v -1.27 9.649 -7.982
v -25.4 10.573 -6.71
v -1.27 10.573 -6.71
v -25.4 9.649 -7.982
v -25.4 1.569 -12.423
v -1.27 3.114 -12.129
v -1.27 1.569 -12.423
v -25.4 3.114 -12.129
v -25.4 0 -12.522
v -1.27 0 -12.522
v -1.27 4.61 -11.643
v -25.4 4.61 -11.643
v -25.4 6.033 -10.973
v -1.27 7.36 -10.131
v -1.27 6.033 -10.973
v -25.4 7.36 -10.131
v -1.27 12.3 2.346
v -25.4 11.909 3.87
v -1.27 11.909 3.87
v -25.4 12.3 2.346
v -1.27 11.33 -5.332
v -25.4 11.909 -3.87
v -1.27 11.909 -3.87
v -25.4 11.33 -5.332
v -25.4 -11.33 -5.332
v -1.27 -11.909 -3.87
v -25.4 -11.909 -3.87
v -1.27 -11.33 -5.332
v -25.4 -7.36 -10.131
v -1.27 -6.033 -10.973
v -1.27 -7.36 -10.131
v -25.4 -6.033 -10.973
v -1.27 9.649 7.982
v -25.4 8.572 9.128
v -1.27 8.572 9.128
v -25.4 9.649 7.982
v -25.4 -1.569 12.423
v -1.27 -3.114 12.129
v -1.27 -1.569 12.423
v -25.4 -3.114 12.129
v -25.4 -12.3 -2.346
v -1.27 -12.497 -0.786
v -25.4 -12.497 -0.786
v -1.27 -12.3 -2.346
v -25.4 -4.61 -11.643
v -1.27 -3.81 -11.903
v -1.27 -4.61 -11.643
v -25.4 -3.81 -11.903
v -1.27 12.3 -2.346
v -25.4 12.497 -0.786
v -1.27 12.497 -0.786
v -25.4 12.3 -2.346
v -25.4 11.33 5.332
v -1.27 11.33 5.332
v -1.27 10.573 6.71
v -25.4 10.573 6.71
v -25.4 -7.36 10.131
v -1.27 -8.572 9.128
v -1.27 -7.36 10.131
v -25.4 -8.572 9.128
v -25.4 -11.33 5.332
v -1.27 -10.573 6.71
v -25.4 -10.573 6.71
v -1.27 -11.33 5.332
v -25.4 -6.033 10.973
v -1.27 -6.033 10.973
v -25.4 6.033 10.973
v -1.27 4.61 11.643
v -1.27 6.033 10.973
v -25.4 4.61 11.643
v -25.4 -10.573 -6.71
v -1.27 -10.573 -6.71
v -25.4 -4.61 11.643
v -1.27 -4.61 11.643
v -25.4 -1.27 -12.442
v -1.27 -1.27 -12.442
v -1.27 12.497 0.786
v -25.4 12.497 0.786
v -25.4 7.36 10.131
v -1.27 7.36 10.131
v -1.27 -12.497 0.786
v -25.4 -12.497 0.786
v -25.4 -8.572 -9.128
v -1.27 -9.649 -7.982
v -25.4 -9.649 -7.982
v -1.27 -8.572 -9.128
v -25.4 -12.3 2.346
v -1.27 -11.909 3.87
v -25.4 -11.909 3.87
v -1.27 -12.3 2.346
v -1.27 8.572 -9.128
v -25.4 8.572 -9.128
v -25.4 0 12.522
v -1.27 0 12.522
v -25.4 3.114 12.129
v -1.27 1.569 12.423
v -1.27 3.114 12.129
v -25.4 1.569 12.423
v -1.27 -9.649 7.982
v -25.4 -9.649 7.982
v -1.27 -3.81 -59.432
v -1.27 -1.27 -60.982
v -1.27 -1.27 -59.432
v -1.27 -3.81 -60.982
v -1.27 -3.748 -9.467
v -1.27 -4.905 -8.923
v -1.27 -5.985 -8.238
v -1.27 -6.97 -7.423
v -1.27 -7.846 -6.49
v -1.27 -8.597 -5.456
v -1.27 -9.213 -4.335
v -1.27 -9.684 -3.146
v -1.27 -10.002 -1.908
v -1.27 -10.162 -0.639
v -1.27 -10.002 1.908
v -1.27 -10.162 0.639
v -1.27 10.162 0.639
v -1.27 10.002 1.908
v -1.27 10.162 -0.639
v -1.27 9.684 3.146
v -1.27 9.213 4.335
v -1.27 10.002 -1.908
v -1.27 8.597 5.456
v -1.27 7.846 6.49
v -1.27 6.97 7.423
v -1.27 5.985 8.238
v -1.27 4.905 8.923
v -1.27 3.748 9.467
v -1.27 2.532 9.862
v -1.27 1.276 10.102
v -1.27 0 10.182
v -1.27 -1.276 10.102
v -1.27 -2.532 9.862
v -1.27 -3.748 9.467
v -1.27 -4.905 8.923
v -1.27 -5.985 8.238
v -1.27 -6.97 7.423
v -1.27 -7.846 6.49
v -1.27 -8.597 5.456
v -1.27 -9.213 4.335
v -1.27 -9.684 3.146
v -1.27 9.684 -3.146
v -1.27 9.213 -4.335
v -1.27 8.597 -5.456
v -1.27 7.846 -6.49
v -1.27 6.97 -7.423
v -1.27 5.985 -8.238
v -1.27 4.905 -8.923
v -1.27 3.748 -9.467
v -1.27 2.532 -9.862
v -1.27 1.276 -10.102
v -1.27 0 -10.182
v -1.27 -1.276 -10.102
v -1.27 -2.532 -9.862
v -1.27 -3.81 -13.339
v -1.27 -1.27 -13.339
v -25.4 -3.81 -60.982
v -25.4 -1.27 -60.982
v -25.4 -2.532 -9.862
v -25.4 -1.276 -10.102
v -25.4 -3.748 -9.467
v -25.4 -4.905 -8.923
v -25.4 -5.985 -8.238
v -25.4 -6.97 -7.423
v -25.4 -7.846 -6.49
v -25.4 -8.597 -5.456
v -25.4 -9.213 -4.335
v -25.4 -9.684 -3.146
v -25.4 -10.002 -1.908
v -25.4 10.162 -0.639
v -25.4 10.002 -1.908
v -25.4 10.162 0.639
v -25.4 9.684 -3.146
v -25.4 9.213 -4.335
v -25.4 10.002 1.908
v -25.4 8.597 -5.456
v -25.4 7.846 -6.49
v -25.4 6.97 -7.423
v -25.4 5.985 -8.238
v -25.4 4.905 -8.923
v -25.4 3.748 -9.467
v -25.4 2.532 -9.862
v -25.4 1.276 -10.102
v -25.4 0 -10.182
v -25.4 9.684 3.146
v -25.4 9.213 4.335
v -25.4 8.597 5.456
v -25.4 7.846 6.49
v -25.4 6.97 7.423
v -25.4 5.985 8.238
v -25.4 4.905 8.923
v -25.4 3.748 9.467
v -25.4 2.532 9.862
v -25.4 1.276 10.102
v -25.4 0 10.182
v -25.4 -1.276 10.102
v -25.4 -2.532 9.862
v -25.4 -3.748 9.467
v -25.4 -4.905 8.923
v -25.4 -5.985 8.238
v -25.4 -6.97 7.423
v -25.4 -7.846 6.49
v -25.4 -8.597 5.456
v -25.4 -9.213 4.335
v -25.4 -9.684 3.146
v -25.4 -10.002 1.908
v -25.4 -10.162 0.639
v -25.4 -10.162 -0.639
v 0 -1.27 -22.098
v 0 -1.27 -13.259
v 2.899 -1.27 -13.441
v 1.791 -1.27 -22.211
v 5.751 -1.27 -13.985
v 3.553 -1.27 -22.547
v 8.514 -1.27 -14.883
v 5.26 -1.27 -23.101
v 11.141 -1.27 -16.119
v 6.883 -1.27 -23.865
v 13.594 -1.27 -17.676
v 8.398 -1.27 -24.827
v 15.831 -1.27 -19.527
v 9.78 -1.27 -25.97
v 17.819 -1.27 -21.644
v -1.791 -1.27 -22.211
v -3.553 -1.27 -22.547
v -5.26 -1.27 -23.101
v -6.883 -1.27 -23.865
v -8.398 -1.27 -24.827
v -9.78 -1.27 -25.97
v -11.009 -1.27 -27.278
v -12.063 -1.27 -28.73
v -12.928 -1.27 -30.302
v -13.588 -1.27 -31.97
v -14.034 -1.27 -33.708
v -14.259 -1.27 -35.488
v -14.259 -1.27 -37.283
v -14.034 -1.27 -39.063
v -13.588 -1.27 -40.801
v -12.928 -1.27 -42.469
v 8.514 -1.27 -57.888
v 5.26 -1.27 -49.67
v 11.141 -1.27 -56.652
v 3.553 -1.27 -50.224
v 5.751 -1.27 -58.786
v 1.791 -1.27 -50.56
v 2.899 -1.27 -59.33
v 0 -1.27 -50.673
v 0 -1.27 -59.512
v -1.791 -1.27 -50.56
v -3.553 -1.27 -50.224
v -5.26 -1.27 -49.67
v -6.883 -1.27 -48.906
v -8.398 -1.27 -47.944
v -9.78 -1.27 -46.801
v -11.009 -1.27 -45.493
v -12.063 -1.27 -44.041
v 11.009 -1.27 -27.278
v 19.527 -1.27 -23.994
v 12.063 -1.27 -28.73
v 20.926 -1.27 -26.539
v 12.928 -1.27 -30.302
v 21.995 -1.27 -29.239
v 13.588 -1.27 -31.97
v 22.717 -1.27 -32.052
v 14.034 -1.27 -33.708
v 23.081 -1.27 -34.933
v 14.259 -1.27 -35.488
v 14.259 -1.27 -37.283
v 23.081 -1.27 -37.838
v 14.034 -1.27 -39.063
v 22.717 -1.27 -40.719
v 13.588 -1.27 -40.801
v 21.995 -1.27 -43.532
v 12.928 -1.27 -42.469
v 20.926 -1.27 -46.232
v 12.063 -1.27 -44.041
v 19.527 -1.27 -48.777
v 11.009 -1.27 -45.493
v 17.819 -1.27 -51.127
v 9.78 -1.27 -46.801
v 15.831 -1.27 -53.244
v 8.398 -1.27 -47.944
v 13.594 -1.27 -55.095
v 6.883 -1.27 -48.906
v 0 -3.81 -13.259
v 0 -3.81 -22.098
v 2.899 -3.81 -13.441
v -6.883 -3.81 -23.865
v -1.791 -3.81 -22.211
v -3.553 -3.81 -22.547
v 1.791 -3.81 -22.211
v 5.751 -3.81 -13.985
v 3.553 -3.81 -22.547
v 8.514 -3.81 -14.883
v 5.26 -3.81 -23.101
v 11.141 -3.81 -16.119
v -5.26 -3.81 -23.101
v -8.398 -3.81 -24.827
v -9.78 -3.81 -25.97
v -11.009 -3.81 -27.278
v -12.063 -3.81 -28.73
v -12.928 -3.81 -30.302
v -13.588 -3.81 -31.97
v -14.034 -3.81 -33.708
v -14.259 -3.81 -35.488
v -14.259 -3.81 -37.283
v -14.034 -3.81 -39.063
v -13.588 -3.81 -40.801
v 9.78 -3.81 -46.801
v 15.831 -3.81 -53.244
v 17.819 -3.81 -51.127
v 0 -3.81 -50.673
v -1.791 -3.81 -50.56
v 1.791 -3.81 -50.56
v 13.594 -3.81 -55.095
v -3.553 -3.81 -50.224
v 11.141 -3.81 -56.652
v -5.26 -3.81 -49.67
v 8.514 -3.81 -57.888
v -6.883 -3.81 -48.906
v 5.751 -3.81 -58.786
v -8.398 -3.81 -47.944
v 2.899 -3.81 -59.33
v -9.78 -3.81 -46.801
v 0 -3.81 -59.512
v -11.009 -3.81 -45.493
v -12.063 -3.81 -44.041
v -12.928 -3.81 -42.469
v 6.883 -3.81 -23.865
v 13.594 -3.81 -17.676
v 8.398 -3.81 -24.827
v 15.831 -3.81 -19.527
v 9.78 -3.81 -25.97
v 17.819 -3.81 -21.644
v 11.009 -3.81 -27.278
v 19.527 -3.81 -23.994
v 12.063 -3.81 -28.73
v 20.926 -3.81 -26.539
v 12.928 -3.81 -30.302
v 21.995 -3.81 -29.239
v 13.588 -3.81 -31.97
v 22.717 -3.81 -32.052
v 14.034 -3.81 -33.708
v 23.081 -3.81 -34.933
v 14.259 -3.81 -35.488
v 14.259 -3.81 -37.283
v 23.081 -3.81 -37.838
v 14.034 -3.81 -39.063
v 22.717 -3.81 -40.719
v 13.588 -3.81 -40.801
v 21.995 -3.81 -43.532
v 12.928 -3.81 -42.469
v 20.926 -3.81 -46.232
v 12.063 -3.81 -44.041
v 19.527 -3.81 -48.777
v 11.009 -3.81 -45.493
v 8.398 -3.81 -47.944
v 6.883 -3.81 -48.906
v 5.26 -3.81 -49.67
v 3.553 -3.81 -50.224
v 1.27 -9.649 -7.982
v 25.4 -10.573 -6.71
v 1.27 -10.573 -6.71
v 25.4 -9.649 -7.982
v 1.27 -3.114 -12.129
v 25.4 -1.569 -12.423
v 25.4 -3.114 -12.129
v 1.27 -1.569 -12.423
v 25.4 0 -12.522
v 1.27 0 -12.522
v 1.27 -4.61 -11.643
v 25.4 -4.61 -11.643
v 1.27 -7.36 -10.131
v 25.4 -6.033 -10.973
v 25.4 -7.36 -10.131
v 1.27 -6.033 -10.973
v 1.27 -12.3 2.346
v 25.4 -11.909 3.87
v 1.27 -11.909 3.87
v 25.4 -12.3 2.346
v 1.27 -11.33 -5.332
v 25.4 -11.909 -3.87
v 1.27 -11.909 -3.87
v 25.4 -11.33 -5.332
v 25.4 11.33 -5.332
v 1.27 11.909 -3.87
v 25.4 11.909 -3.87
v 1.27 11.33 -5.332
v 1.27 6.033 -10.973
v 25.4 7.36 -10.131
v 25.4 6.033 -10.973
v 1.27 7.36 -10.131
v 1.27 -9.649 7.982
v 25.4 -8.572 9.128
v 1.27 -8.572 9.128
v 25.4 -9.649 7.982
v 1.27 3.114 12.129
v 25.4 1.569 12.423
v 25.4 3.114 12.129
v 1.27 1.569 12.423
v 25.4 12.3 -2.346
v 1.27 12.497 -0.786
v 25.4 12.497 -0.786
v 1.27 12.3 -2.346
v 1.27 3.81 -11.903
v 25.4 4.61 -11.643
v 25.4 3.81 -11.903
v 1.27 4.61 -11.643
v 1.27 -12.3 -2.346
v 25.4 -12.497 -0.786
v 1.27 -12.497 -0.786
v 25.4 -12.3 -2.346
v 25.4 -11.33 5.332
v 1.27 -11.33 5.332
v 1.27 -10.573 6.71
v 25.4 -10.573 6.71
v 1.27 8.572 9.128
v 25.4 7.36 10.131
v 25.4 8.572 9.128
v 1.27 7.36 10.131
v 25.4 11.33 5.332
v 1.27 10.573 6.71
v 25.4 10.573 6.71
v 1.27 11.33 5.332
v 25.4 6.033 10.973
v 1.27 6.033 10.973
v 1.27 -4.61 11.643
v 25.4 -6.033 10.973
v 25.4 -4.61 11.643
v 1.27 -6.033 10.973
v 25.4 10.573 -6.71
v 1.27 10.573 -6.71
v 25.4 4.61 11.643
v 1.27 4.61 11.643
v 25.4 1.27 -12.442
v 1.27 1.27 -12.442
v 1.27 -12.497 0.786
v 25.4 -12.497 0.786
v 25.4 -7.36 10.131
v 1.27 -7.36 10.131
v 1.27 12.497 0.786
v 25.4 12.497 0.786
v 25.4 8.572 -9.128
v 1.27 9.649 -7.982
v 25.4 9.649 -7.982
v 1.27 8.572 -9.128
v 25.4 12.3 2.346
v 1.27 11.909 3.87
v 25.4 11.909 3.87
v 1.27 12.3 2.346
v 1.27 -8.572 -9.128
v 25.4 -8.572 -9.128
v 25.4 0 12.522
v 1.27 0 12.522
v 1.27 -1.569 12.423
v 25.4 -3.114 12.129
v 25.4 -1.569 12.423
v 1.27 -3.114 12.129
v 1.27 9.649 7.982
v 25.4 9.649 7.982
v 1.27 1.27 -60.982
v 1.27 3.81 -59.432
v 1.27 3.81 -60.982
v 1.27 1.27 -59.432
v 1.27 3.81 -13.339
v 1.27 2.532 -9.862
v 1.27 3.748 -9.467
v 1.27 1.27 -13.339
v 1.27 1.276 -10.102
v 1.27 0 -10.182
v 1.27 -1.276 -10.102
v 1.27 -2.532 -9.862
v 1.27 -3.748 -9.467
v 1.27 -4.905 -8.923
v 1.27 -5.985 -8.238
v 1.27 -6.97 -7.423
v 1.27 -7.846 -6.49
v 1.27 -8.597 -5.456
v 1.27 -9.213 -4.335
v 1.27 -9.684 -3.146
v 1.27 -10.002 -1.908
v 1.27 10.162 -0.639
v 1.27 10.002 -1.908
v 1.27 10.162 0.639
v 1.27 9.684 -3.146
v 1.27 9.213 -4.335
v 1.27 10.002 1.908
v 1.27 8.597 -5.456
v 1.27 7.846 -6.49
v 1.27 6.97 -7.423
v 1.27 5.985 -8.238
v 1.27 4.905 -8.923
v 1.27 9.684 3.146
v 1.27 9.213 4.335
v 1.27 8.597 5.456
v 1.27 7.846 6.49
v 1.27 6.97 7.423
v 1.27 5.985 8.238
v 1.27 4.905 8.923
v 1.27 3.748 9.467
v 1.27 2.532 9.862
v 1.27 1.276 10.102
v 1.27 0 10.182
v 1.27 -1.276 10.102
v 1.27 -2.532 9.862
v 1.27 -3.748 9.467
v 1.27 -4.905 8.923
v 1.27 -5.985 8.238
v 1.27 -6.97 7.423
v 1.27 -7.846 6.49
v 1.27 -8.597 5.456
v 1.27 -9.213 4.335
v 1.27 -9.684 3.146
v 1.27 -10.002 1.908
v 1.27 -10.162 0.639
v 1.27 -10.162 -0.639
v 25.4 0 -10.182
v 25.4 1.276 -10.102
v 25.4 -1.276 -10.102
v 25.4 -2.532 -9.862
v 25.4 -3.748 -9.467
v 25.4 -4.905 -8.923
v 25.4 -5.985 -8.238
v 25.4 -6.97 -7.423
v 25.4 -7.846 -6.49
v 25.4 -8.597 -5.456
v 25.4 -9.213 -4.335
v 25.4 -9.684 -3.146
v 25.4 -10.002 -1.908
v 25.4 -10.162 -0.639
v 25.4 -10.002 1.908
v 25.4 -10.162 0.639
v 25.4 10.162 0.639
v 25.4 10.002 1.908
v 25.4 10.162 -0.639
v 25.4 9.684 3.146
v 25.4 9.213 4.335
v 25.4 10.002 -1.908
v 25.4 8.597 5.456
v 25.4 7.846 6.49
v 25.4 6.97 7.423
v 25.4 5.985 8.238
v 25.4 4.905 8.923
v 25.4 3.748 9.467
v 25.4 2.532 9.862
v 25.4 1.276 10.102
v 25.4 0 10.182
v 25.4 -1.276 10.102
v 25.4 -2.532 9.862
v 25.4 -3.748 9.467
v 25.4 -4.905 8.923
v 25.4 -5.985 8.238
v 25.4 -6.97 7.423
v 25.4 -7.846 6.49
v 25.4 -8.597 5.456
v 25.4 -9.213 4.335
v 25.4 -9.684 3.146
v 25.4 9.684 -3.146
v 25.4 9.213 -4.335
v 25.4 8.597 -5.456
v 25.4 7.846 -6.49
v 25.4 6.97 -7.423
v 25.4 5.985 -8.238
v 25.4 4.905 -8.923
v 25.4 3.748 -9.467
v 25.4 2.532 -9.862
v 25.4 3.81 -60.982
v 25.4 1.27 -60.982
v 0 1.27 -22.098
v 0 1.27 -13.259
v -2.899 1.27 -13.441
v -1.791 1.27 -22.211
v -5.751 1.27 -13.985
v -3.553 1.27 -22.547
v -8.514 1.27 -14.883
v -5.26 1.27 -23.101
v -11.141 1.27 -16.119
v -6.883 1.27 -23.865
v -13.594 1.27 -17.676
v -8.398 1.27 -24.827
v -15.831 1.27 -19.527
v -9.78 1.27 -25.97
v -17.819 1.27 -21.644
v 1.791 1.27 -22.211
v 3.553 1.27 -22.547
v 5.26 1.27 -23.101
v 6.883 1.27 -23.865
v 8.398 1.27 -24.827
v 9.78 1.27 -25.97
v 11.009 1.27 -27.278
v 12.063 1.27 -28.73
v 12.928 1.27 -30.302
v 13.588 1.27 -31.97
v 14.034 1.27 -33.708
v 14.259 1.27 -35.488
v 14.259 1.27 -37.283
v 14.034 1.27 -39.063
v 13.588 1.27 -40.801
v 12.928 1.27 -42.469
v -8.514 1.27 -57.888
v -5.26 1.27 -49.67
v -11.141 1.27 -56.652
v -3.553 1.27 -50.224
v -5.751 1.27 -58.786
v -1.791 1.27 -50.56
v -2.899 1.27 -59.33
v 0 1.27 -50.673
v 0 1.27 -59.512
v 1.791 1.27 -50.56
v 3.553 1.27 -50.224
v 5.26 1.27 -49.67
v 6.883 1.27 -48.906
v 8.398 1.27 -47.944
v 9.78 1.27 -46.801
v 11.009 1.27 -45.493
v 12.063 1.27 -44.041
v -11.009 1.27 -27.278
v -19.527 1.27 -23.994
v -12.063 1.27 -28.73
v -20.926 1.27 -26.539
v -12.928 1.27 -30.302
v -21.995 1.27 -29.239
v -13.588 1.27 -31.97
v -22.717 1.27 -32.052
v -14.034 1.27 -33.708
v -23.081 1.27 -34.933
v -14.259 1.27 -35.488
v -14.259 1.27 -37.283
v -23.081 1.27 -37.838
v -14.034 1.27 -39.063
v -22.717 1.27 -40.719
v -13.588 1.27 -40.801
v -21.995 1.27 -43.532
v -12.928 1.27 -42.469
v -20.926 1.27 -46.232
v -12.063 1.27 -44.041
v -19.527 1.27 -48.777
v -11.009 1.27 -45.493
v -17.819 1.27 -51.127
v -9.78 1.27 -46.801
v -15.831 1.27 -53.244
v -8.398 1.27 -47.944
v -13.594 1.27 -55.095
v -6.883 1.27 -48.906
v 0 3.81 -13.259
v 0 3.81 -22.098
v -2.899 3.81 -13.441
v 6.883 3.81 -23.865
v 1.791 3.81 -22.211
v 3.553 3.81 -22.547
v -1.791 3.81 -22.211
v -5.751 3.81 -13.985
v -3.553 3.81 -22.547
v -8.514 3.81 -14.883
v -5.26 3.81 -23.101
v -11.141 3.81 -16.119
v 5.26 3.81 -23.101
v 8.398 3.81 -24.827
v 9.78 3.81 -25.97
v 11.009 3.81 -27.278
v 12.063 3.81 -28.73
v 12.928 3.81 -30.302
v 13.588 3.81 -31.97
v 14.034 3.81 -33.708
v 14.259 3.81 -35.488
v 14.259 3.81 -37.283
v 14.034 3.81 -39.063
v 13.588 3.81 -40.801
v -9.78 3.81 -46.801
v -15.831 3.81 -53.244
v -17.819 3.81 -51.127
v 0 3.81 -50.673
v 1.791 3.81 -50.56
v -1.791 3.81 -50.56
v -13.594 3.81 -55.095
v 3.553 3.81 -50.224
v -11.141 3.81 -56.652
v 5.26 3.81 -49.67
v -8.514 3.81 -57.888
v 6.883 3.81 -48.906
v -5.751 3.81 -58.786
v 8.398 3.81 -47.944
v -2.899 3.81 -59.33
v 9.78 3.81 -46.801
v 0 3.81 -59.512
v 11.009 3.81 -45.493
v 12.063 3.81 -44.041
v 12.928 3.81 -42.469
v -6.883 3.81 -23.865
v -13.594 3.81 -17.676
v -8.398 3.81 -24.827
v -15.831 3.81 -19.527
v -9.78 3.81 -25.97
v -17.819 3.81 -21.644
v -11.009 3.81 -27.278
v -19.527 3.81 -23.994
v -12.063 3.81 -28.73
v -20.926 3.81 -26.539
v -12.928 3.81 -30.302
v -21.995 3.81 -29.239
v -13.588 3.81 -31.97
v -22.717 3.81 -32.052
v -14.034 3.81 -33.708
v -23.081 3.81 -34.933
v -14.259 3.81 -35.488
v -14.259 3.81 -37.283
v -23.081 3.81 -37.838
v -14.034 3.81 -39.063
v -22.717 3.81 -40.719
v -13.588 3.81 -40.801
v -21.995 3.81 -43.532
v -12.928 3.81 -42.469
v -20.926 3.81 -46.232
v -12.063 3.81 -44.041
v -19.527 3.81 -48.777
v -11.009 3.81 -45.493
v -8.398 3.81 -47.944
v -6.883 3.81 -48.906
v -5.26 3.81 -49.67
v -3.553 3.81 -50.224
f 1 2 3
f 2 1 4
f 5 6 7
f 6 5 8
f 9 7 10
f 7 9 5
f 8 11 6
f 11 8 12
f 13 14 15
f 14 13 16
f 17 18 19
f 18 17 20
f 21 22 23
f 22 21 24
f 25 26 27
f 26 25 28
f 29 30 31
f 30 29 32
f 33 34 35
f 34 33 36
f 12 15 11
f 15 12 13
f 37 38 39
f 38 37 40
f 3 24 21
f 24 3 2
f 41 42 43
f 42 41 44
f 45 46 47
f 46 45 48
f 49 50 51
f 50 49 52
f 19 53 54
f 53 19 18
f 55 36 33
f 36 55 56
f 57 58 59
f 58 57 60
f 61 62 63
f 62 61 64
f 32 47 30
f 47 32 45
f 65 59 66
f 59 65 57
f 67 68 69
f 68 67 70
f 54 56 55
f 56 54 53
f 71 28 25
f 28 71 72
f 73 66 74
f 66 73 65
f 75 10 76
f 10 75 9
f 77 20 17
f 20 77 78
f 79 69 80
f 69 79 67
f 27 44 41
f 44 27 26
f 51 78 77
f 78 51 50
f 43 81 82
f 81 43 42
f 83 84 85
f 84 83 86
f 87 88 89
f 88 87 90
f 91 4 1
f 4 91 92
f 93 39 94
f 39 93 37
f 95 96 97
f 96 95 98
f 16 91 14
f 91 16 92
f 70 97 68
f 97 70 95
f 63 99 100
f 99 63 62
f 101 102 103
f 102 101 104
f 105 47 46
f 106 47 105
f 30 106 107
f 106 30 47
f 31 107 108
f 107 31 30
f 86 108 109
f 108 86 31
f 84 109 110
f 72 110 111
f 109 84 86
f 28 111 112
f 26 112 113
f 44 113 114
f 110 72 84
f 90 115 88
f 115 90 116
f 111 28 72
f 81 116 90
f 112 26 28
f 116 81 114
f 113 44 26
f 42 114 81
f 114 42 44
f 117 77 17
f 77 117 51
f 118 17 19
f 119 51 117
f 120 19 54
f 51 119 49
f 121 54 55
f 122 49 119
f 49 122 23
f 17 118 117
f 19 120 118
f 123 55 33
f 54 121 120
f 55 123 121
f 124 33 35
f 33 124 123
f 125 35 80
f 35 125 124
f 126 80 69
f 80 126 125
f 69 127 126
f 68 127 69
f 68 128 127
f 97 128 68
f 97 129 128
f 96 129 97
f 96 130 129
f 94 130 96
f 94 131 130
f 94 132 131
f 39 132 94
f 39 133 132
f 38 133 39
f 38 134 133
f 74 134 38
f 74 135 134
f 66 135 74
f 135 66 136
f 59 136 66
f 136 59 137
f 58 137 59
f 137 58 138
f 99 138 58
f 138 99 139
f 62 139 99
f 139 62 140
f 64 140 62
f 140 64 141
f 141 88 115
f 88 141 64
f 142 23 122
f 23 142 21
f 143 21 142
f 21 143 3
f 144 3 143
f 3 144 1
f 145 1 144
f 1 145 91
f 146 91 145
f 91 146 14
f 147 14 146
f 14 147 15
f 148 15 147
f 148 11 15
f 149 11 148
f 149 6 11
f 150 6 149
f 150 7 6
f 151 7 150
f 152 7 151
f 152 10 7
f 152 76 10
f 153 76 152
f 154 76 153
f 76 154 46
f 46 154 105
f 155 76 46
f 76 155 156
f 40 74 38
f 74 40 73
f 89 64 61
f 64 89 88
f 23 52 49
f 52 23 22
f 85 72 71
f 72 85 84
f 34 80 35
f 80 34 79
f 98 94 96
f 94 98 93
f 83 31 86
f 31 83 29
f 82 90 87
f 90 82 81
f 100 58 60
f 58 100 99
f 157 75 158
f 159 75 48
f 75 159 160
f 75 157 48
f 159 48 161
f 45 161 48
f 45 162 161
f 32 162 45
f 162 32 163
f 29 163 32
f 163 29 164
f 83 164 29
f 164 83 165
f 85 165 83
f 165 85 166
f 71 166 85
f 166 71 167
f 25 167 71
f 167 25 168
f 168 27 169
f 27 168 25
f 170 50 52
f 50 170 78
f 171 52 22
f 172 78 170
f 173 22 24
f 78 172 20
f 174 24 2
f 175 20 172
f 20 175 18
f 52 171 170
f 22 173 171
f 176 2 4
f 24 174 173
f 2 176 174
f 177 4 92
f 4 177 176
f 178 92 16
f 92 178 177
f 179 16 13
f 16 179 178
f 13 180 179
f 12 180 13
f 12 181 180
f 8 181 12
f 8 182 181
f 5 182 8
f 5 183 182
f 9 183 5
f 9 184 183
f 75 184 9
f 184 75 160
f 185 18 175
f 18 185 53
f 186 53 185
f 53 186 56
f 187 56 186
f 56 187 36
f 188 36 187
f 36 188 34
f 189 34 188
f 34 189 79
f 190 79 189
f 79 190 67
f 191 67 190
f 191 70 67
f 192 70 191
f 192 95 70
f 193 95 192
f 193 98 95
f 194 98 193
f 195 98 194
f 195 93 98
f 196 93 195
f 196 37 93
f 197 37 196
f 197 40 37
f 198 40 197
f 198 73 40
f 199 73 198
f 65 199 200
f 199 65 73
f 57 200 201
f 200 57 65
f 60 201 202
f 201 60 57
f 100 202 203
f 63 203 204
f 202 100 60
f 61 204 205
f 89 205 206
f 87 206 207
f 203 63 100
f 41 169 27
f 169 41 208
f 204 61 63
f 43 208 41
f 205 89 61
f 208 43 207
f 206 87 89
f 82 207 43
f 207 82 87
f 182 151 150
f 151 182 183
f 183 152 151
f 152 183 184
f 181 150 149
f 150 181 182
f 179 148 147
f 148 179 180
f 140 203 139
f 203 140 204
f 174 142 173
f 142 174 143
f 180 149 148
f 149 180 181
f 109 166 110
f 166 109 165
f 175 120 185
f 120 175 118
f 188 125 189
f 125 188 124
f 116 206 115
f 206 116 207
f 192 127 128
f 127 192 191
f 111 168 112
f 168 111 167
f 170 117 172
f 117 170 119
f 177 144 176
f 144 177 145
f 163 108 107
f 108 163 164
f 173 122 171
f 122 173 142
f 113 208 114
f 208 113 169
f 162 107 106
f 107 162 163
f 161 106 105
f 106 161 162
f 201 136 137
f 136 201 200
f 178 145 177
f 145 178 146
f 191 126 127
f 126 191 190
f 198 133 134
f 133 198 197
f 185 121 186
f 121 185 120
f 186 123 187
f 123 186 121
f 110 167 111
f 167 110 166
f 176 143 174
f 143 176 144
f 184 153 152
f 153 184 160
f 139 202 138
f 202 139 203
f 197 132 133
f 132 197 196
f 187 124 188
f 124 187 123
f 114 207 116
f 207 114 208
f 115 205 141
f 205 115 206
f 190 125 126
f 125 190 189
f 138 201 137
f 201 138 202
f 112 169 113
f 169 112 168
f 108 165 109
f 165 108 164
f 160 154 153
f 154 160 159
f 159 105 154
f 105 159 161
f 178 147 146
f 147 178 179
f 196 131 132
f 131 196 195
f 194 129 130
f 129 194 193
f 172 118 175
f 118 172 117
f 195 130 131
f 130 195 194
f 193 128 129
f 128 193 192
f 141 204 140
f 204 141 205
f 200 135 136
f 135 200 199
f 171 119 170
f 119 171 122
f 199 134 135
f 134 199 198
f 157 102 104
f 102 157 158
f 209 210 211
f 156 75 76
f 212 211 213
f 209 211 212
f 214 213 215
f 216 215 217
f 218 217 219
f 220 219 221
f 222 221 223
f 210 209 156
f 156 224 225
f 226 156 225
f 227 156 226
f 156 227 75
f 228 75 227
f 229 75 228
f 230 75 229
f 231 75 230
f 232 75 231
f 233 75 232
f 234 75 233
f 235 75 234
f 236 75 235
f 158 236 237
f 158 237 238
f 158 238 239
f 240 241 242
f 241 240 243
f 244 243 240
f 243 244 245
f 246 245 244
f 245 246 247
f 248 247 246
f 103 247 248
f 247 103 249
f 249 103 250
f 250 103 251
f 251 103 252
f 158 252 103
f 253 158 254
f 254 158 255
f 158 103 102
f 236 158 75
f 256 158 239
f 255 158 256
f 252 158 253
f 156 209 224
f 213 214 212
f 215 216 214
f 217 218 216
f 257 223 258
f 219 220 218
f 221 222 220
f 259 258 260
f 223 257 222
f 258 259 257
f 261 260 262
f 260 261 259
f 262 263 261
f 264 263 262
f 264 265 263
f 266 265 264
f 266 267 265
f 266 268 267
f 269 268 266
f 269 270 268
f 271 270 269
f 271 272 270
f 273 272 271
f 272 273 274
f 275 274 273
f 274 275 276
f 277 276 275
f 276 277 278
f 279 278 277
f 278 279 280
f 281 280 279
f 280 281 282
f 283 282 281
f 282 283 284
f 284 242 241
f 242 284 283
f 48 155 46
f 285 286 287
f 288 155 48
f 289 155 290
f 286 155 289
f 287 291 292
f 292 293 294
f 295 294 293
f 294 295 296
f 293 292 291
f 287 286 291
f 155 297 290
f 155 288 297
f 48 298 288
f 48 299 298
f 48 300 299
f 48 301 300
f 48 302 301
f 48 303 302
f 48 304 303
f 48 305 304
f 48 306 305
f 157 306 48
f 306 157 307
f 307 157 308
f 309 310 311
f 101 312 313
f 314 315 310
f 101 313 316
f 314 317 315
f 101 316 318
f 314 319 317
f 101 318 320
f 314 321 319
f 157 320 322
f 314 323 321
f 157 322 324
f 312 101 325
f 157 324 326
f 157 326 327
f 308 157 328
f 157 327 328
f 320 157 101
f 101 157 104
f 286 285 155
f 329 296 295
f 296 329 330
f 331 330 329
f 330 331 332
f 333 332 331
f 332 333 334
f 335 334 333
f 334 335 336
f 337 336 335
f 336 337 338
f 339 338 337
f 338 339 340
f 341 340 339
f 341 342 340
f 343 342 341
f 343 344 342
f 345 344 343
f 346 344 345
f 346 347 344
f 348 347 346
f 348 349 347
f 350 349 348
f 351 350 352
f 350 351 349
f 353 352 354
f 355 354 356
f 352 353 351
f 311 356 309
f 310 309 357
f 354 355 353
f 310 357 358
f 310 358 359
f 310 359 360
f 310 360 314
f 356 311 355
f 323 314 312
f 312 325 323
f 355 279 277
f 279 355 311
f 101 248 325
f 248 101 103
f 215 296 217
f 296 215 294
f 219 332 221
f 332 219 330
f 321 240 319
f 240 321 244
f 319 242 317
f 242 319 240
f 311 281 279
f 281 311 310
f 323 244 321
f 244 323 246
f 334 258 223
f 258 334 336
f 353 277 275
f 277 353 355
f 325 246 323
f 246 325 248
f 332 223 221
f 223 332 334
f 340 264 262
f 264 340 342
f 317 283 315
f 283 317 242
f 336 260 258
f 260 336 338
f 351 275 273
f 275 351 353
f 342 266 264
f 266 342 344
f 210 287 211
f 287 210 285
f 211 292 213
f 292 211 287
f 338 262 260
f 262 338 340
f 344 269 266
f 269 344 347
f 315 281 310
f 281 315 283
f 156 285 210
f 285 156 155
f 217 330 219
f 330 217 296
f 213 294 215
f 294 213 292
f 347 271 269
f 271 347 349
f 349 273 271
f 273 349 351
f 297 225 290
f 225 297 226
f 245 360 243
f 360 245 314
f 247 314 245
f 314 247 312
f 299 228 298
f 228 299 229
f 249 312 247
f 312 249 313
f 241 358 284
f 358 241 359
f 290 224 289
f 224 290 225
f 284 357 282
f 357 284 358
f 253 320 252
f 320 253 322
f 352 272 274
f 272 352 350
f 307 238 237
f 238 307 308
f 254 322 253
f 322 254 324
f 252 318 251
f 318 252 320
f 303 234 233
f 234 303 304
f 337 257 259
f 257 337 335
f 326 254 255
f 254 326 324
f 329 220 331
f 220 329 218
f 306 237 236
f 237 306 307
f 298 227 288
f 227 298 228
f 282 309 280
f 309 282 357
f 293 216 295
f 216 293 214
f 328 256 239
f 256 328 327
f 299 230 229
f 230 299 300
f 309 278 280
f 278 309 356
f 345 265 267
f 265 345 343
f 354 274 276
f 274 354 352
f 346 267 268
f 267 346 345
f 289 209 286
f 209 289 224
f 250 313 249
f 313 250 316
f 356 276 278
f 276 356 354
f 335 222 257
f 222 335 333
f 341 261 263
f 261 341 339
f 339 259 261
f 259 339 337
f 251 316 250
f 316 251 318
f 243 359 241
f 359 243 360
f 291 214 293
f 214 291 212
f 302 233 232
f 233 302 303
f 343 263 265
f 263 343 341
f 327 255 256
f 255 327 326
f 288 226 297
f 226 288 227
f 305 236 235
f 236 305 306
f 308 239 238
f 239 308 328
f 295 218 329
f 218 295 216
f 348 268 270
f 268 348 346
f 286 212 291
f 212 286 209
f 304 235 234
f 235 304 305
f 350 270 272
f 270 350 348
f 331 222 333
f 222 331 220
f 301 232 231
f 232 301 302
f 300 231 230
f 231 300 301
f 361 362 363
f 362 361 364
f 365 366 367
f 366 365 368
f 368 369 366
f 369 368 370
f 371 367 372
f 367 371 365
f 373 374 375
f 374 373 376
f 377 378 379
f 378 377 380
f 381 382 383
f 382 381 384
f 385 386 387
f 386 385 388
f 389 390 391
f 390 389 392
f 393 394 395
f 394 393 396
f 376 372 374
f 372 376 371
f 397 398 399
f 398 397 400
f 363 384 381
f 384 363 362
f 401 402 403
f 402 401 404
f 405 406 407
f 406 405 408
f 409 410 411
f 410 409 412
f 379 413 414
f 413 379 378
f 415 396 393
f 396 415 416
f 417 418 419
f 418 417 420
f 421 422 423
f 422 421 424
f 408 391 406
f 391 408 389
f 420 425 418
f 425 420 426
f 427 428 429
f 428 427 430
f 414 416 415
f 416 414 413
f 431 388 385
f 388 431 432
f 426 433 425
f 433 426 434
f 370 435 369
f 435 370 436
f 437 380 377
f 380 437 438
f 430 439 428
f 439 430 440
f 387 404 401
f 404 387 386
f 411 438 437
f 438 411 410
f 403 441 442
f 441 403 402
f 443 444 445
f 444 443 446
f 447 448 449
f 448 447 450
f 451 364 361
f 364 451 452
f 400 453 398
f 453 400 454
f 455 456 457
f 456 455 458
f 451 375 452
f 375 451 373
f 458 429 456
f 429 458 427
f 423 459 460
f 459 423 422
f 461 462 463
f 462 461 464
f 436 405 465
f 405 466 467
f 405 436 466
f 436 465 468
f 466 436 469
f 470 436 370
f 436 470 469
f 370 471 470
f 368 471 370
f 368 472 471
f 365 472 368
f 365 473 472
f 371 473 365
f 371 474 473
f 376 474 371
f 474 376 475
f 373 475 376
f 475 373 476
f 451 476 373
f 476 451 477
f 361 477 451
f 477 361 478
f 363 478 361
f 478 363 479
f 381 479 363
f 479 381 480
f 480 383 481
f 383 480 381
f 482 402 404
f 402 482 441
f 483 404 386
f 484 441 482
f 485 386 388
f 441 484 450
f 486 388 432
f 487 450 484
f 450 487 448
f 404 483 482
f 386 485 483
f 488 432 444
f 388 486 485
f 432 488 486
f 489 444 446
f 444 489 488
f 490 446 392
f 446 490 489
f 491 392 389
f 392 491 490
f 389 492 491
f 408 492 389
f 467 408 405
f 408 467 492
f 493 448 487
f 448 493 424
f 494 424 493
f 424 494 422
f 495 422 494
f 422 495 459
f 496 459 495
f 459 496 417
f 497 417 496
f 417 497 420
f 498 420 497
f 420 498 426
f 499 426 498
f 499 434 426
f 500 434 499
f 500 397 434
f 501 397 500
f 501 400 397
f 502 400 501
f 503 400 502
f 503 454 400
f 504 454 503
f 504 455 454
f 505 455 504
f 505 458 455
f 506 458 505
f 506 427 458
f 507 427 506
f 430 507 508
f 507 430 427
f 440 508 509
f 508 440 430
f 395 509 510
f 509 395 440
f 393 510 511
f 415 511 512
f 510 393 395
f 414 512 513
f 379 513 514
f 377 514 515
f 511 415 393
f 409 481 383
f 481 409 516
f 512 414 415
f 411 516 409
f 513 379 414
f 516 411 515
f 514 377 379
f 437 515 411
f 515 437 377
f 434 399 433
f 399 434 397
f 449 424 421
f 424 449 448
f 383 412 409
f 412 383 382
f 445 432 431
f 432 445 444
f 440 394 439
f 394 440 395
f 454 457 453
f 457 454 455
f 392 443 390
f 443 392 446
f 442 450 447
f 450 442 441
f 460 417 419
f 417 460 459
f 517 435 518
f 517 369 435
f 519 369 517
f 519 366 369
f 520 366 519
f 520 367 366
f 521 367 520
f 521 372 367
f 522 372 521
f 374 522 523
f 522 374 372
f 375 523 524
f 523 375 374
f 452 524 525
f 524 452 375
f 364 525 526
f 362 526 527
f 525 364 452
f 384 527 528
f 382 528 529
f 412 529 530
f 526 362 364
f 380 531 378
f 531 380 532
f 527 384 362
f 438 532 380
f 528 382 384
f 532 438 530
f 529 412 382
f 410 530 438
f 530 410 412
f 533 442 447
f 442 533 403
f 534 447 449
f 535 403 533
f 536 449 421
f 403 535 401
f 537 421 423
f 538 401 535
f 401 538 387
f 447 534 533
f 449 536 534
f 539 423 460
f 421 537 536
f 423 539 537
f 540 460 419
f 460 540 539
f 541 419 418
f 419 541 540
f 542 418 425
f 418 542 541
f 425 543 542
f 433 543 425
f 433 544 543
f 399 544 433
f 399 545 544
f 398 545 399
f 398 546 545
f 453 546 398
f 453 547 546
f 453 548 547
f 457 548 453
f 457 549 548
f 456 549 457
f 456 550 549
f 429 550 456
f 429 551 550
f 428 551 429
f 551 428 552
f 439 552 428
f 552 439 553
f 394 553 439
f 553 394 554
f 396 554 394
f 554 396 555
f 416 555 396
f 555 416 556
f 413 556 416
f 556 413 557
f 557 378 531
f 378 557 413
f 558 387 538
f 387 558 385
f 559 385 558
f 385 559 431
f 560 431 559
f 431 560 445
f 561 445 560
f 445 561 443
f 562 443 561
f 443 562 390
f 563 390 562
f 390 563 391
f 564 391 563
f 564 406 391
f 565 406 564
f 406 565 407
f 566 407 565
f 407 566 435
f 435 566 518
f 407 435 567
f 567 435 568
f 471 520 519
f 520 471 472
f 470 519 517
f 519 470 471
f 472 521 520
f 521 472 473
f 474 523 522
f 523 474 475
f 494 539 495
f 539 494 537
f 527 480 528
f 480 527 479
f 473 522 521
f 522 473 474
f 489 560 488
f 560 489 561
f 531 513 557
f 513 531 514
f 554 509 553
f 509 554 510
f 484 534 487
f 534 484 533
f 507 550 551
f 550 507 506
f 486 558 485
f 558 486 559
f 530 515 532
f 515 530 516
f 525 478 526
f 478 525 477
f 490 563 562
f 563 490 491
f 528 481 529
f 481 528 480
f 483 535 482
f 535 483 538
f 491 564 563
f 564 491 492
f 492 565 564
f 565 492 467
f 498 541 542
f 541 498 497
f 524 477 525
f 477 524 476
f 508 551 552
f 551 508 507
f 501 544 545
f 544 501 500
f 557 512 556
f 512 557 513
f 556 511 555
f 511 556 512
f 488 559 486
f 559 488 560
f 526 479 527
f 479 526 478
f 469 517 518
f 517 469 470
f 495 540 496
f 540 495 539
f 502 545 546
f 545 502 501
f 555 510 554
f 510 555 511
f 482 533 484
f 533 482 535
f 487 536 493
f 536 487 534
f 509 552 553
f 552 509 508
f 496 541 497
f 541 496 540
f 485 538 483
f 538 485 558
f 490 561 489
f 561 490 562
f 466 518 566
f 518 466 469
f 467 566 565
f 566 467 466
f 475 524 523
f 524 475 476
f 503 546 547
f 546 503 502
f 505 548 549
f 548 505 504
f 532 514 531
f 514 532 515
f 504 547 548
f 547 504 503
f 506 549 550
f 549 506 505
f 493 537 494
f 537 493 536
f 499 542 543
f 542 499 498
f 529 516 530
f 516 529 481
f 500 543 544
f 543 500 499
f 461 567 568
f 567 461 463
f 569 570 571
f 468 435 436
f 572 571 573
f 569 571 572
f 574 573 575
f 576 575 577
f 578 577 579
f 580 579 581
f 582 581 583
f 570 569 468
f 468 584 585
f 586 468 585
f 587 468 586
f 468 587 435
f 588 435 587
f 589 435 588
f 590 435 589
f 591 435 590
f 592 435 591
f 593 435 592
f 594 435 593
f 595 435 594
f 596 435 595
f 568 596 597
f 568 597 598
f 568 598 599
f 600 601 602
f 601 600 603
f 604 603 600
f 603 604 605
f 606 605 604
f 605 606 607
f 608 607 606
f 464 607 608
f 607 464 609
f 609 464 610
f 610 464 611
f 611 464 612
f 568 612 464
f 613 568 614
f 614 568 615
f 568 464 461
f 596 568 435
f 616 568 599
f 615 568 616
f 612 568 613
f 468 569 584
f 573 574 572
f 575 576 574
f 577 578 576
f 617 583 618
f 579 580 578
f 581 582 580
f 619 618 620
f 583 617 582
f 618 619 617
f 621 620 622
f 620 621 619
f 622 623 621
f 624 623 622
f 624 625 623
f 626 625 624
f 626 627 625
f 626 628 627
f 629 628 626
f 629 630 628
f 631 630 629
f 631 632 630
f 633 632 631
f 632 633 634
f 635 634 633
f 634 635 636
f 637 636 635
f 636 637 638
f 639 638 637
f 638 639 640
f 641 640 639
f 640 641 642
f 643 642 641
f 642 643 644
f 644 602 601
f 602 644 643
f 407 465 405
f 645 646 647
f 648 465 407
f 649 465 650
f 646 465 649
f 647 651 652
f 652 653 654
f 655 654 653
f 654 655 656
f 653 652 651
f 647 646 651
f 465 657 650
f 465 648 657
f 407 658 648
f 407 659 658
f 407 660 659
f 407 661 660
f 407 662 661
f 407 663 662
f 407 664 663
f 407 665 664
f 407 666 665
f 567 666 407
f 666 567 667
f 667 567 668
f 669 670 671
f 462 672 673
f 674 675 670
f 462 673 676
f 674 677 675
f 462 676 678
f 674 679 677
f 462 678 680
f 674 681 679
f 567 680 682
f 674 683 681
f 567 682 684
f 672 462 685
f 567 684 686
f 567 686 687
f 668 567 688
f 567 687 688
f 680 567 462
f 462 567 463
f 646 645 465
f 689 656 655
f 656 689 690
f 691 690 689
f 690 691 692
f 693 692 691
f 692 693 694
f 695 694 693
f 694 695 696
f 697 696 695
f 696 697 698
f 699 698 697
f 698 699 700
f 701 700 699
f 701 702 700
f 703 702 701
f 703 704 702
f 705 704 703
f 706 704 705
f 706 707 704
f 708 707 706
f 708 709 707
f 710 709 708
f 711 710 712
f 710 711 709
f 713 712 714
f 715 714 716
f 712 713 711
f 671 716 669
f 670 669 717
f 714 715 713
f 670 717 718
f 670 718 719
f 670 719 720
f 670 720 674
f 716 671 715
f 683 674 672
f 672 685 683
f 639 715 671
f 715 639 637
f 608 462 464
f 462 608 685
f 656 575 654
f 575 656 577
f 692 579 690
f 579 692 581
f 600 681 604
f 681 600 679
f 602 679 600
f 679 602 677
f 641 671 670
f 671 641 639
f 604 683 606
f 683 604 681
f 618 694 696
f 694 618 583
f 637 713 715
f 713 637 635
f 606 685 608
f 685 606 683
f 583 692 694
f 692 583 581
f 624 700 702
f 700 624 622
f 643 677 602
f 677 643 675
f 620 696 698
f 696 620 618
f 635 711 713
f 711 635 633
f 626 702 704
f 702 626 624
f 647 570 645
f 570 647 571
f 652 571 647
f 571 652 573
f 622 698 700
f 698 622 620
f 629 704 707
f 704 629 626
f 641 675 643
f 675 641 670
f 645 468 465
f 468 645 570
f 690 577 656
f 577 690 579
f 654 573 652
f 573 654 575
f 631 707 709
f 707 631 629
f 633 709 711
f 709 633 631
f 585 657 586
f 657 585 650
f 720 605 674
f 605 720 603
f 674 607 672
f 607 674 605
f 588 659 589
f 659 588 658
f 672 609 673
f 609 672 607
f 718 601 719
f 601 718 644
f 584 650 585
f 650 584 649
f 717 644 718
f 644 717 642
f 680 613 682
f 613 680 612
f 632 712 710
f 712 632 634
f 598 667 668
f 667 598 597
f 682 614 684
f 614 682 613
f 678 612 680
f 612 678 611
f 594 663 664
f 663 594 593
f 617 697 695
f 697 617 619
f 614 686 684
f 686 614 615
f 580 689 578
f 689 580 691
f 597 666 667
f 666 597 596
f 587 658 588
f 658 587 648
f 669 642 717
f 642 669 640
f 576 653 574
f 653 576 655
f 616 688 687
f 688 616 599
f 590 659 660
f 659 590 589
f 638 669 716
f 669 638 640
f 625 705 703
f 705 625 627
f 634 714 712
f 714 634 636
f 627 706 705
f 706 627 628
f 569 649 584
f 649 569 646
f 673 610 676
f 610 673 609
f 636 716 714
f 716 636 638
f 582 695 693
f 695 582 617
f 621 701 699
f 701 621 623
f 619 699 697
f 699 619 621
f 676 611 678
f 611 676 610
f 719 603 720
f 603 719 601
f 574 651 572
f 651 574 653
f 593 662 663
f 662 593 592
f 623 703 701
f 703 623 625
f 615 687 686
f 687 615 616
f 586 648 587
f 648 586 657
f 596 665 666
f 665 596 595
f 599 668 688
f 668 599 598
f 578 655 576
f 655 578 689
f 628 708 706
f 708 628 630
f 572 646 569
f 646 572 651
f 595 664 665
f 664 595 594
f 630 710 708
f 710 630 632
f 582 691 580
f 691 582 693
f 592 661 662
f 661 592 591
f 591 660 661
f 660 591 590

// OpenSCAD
in = 25.4;
$fn = 50;

carbonTube1 = [0.314*in,0.393*in,"McMaster"];

myTube = carbonTube1;
tubeId = myTube[0];
tubeOd = myTube[1];
tubeLen = 12*in;


module tube(id, od, length)
{
    translate([-length/2,0,0])
    rotate([0,90,0])
    difference()
    {
        cylinder(r=od,h=length);
        translate([0,0,-0.1])
        cylinder(r=id,h=length+0.2);
    }
}

module connector(tubeOd,tubeWall,thickness,length,plateThickness,plateSide,gap,adj)
{
    rotate([0,90,0])
    {
        difference()
        {
            union()
            {
                difference()
                {
                    cylinder(r=tubeOd+thickness, h=length);
                    translate([0,0,-0.1])
                    cylinder(r=tubeOd+adj, h=length+0.2);
                    
                }
                translate([tubeOd+adj,-(thickness+gap/2),0])
                cube([plateSide,plateThickness,length]);
                translate([plateSide/2+tubeOd+tubeWall/2,-gap/2,length+gap/2])
                rotate([90,0,0])
                cylinder(r=(plateSide-tubeWall)/2-gap/2,h=plateThickness);
            }
            translate([plateSide/2+tubeOd+tubeWall/2,-gap/2,length+gap/2])
            rotate([90,0,0])
            translate([0,0,-0.1])
            cylinder(r=1.125*in/2,h=plateThickness+0.2);
        }
    }
}

connectorThickness = 0.1*in;
connectorPlateThickness = 0.1*in;
connectorPlateSide = 2*in;
connectorPlateOverlap = 0.2*in;
connectorAdj = 0.2;
connectorGap = 0.1*in;
connectorLength = (connectorPlateSide - connectorGap)/2;

tubeWall = tubeOd - tubeId;

/*
translate([tubeLen/2-connectorLength,0,0])
connector(tubeOd,connectorThickness,connectorLength,connectorPlateThickness,connectorPlateSide,connectorGap,connectorAdj);

color("gray")
tube(tubeId,tubeOd,tubeLen);
*/


translate([-connectorPlateSide/2,0,0])
connector(tubeOd,tubeWall,connectorThickness,connectorLength,connectorPlateThickness,connectorPlateSide,connectorGap,connectorAdj);


rotate([0,0,180])
translate([-connectorPlateSide/2,0,0])
connector(tubeOd,tubeWall,connectorThickness,connectorLength,connectorPlateThickness,connectorPlateSide,connectorGap,connectorAdj);
